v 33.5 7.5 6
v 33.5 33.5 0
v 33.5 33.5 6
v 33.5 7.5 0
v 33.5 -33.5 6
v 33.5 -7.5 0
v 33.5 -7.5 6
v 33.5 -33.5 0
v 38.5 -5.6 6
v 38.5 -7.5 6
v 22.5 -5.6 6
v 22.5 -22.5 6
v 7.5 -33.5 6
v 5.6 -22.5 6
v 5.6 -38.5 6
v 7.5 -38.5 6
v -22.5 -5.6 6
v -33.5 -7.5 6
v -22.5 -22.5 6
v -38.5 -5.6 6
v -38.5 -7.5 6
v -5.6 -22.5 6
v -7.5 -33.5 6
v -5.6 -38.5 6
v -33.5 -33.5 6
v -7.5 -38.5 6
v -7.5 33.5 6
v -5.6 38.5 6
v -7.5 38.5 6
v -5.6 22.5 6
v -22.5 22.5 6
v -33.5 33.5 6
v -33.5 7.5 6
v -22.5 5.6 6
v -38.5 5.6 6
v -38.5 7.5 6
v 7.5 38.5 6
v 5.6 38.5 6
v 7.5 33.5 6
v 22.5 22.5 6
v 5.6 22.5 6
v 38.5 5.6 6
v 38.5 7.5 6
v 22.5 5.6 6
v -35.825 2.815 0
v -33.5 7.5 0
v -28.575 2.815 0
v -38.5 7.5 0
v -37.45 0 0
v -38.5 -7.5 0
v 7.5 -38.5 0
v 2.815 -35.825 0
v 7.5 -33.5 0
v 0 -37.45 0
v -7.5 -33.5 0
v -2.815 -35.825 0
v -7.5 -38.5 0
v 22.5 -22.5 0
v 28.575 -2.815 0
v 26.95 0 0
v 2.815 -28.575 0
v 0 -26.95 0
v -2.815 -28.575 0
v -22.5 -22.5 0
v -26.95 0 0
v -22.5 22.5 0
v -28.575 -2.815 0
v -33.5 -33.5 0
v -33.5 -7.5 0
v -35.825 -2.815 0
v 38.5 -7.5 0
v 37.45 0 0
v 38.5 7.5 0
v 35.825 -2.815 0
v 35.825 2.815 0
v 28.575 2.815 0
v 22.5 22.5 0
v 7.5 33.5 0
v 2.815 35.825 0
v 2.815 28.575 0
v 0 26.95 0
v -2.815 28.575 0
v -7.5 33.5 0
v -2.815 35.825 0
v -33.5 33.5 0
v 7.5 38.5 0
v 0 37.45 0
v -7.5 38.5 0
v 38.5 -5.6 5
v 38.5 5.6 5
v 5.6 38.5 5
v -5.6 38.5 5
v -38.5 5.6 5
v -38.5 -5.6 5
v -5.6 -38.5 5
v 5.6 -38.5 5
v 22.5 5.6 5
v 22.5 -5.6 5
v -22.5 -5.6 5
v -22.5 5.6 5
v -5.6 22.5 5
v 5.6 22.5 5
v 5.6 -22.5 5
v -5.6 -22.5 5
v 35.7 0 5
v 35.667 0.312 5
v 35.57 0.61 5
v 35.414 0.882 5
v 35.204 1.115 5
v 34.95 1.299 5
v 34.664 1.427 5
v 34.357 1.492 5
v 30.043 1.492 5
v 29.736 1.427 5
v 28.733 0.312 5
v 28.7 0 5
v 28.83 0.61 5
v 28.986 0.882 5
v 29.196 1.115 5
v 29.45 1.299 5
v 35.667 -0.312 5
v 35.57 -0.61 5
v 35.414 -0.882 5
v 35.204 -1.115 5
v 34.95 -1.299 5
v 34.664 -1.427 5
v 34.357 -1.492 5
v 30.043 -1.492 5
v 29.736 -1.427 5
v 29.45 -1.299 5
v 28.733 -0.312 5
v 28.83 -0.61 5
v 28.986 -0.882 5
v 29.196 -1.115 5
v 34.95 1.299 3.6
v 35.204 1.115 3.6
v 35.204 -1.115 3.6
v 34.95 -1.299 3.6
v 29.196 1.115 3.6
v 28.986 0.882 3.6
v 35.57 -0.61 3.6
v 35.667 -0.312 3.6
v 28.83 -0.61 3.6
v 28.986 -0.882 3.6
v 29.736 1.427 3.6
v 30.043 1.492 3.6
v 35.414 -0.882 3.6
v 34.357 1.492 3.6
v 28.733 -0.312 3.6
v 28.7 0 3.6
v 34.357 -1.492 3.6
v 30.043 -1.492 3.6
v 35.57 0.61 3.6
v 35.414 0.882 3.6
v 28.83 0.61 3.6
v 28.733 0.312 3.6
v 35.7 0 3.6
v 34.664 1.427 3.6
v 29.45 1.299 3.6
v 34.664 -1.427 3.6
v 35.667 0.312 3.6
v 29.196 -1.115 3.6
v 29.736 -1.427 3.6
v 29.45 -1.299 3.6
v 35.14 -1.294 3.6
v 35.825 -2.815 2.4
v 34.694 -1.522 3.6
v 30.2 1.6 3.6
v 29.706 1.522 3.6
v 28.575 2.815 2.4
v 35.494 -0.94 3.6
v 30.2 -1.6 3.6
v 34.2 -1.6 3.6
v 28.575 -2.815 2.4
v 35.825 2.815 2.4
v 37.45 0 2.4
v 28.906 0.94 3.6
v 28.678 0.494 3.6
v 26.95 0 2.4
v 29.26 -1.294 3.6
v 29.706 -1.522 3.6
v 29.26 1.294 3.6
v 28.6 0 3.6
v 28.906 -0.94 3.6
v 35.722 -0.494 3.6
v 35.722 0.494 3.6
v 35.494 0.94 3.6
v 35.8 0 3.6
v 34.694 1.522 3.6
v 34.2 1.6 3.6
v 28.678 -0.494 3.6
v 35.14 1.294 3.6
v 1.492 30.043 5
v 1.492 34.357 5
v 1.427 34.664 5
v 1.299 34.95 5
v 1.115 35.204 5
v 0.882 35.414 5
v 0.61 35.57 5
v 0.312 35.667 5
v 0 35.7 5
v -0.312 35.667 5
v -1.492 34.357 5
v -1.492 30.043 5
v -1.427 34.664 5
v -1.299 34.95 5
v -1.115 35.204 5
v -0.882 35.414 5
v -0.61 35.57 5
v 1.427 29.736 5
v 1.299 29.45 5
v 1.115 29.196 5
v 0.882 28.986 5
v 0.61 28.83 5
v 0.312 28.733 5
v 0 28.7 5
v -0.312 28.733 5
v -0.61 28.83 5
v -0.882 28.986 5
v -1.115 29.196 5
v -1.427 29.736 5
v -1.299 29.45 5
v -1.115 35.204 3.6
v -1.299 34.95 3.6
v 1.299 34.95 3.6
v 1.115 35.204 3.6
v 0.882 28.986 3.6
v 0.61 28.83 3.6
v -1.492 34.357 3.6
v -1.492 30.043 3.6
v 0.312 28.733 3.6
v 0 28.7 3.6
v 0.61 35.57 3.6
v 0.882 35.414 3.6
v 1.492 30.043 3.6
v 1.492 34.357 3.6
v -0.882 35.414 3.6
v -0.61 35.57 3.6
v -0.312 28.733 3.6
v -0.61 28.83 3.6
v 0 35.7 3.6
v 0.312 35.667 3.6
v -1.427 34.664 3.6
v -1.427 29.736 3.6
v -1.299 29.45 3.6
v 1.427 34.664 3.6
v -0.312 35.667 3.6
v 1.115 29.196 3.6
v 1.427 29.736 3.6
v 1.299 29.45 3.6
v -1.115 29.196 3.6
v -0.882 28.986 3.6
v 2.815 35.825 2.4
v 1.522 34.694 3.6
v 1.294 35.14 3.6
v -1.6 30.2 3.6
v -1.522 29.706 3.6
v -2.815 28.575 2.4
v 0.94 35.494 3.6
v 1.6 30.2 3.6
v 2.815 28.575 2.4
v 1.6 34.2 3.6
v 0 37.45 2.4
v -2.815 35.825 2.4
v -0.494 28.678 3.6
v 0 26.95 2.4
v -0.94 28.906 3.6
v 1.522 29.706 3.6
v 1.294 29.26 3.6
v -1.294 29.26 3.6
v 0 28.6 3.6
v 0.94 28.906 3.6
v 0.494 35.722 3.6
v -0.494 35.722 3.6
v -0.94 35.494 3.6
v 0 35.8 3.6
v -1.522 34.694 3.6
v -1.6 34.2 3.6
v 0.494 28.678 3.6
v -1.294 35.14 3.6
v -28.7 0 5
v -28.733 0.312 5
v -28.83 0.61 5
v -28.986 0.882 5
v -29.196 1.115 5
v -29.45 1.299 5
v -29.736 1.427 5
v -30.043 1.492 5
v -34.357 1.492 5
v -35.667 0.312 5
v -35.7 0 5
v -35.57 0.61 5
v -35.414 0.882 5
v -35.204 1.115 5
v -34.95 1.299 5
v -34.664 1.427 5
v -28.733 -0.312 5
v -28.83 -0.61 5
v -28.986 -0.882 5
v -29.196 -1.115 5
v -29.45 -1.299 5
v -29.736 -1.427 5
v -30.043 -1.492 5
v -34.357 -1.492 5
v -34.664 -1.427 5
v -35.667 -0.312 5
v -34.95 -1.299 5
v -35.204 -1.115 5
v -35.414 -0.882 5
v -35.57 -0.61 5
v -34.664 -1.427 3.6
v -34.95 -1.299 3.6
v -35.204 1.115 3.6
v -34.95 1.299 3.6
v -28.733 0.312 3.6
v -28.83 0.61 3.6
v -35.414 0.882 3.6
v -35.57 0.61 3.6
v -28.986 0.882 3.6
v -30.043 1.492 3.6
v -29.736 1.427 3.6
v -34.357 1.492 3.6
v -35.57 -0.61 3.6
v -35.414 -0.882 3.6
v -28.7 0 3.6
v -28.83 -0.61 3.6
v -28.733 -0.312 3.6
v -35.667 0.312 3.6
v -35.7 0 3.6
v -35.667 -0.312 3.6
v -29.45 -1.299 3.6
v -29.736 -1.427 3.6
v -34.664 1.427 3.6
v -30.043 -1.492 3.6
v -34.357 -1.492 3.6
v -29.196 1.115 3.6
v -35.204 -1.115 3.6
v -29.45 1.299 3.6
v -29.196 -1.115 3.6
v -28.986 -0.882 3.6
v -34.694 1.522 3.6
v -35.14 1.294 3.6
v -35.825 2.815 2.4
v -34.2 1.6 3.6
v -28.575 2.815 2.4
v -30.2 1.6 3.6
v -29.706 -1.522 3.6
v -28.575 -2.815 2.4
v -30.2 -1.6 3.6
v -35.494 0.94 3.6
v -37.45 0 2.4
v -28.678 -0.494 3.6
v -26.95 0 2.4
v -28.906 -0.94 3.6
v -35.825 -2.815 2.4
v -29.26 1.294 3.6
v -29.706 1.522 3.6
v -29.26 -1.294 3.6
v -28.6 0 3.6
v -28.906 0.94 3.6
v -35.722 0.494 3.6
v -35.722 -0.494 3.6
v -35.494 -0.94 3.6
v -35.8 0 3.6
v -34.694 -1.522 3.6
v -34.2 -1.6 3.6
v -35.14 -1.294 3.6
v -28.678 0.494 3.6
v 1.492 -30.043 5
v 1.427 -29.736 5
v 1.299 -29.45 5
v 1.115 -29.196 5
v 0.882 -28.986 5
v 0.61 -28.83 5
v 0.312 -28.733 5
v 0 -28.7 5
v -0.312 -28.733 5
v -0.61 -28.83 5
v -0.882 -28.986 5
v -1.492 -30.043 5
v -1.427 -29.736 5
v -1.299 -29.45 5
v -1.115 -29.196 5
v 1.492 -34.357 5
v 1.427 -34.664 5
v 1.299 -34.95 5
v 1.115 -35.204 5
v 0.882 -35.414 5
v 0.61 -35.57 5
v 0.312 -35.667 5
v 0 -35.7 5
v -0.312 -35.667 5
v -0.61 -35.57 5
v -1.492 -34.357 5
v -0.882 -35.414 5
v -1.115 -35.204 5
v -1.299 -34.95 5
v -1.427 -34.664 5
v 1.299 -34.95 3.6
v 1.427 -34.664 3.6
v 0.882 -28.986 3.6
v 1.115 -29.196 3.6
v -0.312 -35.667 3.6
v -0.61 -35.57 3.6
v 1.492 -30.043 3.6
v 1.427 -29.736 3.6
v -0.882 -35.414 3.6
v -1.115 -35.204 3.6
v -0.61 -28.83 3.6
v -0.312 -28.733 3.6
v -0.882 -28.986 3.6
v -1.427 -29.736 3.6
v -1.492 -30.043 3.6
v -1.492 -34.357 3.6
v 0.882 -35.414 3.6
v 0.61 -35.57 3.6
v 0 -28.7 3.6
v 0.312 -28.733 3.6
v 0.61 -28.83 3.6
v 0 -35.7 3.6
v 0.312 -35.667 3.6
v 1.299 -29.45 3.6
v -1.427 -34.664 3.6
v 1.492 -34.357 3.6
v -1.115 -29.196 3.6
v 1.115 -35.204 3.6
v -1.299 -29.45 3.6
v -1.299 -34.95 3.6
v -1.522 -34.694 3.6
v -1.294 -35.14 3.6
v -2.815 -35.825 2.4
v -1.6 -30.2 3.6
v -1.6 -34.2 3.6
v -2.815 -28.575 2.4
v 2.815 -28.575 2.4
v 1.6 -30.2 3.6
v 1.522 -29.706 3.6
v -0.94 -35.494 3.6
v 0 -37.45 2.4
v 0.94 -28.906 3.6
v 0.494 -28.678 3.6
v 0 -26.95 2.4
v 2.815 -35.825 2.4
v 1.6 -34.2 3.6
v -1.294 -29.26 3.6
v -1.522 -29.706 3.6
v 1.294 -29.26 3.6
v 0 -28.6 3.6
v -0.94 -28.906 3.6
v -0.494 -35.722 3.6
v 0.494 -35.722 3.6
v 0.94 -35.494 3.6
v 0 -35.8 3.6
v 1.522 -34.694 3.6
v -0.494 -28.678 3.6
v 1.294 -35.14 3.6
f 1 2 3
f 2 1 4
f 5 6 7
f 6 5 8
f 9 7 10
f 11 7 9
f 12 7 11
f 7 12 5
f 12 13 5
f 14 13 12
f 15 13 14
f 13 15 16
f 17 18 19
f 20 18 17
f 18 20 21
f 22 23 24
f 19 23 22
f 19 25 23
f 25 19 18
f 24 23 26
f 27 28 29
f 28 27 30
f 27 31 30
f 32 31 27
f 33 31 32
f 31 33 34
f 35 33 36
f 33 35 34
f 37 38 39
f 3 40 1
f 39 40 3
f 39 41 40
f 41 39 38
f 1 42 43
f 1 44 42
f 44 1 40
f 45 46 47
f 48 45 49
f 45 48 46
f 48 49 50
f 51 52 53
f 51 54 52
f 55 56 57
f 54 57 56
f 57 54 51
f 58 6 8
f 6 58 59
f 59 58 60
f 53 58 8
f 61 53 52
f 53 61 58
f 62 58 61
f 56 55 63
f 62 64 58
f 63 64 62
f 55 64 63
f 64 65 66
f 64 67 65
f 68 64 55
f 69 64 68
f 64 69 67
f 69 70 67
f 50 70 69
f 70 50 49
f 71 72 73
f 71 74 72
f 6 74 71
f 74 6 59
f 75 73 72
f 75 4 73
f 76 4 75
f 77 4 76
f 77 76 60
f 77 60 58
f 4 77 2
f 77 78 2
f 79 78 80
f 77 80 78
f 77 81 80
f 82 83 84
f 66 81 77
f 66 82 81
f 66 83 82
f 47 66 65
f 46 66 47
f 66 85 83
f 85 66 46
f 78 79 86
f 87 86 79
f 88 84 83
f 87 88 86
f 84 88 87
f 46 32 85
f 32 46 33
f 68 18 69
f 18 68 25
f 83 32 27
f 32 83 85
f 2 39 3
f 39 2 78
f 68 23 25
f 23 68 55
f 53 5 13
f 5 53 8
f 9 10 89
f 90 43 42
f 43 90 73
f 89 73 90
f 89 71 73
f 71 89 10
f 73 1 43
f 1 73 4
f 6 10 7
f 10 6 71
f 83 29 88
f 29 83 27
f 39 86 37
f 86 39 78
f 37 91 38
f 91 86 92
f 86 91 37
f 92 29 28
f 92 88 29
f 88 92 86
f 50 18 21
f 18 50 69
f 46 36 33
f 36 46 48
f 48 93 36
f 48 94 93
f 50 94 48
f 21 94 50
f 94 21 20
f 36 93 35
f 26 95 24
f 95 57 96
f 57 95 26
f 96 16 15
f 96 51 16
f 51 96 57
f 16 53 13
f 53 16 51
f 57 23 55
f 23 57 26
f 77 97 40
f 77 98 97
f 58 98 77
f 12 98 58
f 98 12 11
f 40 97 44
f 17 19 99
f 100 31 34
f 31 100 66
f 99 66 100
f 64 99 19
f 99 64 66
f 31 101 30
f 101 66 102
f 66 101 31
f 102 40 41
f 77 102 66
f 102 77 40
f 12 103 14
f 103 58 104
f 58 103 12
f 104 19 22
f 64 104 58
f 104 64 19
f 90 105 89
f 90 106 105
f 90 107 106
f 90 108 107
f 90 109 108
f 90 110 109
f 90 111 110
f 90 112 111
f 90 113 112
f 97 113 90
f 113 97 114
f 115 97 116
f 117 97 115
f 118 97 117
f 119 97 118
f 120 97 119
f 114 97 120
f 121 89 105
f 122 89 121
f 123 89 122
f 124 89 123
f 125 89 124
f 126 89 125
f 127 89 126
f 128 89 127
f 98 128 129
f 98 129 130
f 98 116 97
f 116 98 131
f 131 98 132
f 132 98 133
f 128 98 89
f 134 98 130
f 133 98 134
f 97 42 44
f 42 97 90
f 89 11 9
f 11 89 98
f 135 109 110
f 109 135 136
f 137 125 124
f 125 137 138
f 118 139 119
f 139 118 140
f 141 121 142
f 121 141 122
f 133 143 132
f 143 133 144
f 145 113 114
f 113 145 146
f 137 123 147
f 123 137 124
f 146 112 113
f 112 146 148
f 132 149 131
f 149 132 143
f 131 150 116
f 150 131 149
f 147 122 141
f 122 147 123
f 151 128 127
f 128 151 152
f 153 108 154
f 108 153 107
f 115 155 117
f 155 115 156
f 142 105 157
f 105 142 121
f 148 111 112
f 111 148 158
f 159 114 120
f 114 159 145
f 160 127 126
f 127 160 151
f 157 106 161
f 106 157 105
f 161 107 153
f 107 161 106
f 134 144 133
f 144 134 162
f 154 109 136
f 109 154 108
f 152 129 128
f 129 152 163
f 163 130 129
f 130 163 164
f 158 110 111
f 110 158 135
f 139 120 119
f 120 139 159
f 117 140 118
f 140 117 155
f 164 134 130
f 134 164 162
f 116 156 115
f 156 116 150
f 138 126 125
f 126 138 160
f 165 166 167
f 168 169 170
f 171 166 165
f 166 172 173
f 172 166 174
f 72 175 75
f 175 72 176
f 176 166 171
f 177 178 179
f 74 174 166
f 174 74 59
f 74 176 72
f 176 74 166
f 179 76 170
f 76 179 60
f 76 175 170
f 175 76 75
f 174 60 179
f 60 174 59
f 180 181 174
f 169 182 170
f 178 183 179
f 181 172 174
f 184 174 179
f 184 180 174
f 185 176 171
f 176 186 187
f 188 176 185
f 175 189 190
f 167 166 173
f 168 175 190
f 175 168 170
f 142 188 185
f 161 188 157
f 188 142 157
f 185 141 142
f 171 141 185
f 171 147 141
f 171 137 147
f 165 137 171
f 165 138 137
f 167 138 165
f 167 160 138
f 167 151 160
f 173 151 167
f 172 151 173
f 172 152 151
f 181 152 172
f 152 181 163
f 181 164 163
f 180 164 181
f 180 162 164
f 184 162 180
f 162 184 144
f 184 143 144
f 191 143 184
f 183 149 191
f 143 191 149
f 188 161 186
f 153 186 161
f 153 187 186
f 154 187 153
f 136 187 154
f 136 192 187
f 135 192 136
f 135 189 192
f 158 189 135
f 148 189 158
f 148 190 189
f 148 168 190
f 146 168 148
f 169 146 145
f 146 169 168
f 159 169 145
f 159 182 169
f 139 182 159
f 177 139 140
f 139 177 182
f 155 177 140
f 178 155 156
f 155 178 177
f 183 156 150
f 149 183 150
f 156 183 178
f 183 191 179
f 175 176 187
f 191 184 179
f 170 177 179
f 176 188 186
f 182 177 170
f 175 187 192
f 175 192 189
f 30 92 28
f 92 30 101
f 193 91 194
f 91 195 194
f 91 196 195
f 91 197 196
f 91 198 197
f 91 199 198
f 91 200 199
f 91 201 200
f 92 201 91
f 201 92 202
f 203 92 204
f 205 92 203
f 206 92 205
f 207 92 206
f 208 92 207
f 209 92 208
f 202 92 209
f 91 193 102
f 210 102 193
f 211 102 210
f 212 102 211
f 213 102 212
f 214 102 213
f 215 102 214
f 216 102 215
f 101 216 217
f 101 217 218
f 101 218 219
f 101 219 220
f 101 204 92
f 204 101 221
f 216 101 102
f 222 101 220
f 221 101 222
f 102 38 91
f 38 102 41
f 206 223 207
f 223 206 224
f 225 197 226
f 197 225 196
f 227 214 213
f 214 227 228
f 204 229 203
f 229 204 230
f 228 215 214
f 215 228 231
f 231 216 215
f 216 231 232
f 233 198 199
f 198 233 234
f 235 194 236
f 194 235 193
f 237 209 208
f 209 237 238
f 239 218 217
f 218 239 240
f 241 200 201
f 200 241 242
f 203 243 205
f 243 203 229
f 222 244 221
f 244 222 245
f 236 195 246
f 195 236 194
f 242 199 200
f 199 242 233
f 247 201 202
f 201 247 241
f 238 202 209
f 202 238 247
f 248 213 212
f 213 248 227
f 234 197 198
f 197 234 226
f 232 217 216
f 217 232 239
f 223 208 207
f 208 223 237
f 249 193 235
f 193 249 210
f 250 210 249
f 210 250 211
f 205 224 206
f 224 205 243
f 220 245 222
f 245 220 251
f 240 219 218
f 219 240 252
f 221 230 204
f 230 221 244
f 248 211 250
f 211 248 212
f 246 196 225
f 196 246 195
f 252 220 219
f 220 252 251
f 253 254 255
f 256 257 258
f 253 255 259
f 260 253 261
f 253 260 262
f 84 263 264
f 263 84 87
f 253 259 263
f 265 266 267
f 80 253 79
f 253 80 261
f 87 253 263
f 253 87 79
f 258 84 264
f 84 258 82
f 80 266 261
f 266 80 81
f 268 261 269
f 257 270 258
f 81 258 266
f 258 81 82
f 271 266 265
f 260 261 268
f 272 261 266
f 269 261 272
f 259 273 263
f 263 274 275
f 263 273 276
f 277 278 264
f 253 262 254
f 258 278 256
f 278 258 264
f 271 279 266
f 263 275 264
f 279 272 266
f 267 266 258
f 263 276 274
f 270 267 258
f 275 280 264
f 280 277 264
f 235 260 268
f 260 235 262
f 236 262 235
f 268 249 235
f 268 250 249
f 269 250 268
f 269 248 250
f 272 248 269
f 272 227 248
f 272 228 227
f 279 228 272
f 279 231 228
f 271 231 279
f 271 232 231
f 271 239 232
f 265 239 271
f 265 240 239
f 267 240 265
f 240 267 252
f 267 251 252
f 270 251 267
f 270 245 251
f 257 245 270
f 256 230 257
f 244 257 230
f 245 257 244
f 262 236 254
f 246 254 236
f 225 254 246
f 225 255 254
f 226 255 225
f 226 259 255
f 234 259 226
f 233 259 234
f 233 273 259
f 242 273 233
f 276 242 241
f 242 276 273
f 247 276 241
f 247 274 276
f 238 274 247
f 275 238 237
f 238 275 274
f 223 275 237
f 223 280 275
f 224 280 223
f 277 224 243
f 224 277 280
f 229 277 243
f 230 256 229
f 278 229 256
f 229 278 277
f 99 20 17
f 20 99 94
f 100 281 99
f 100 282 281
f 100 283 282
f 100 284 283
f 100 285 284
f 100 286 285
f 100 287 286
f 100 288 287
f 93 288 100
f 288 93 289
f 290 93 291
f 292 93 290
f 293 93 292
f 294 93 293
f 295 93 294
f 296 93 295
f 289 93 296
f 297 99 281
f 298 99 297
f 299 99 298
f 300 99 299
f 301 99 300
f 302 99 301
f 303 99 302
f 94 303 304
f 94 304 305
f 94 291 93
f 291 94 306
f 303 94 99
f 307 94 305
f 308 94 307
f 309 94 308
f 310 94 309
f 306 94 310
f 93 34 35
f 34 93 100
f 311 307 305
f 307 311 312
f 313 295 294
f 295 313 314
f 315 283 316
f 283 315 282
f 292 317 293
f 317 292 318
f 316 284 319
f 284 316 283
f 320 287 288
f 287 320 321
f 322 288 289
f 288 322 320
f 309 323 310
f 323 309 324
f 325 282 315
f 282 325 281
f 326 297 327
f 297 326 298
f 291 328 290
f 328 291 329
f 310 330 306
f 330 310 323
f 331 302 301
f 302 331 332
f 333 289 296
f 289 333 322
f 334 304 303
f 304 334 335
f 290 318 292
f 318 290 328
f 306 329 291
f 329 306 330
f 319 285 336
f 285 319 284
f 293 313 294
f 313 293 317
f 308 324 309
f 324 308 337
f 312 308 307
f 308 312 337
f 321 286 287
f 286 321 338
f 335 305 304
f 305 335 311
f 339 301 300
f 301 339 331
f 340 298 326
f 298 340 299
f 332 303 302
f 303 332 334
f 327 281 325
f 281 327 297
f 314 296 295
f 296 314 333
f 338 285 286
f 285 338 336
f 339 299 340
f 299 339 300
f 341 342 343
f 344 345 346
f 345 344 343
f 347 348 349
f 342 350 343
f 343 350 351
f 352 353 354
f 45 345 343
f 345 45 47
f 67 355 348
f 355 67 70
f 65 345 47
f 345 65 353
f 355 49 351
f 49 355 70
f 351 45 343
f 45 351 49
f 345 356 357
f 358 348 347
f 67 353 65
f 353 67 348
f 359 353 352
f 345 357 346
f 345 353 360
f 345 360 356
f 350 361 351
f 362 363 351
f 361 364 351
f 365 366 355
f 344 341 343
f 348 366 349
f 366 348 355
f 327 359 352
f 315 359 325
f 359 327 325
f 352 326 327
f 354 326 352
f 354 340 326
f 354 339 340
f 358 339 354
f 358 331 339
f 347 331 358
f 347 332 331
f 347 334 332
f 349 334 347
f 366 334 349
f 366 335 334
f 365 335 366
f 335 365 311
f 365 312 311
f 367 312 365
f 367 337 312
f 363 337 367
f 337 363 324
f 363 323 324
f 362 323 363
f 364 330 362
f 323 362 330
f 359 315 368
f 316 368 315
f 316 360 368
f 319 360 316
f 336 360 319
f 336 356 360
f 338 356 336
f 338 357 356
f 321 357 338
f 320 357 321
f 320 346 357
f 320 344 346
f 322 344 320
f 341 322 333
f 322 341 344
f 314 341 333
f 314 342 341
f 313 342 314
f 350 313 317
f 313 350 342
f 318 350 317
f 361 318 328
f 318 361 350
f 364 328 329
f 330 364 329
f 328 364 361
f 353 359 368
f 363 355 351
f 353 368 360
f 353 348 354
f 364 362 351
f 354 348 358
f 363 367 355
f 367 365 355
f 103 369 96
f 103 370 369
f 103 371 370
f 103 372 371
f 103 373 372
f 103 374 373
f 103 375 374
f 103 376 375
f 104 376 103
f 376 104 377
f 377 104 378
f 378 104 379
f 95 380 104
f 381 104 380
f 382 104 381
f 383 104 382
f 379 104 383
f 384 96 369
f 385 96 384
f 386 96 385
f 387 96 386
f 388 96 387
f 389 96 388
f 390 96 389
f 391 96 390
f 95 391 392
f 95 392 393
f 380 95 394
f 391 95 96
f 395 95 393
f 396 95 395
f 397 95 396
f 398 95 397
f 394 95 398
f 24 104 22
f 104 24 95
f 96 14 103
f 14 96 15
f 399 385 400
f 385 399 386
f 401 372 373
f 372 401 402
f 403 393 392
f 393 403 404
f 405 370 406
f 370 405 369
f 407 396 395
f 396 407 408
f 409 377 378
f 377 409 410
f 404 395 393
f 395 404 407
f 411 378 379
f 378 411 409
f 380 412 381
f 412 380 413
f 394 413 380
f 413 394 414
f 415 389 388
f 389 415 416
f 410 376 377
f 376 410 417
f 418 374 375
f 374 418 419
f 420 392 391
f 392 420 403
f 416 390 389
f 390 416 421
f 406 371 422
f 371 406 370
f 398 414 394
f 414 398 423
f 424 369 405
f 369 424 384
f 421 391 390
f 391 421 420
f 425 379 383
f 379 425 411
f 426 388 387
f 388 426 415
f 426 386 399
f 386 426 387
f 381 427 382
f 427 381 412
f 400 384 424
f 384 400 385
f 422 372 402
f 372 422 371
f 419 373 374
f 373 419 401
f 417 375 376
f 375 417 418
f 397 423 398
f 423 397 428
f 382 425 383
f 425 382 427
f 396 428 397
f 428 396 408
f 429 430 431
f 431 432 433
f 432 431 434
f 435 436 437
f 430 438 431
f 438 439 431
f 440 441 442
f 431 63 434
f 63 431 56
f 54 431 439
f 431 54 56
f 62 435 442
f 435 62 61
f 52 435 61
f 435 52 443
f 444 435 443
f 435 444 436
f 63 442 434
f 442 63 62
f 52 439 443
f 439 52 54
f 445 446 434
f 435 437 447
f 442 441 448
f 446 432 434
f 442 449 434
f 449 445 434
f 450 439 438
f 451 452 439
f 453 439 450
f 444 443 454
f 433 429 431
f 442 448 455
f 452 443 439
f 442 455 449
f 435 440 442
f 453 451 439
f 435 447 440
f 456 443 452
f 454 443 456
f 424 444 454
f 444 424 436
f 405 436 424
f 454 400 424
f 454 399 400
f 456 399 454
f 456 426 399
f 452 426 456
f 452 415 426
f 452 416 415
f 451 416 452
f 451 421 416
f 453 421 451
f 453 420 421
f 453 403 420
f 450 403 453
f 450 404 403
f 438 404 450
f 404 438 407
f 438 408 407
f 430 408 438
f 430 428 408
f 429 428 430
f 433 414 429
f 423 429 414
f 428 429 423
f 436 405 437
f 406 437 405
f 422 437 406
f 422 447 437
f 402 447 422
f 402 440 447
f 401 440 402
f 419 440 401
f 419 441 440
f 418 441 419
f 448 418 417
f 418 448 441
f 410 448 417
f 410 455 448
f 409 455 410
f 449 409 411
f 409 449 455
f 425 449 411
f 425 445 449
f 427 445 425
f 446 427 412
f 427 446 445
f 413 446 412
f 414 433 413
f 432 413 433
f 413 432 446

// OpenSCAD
use <bed_carriage.scad>

height = 12;
translate([0,0,0]) center_motor();
